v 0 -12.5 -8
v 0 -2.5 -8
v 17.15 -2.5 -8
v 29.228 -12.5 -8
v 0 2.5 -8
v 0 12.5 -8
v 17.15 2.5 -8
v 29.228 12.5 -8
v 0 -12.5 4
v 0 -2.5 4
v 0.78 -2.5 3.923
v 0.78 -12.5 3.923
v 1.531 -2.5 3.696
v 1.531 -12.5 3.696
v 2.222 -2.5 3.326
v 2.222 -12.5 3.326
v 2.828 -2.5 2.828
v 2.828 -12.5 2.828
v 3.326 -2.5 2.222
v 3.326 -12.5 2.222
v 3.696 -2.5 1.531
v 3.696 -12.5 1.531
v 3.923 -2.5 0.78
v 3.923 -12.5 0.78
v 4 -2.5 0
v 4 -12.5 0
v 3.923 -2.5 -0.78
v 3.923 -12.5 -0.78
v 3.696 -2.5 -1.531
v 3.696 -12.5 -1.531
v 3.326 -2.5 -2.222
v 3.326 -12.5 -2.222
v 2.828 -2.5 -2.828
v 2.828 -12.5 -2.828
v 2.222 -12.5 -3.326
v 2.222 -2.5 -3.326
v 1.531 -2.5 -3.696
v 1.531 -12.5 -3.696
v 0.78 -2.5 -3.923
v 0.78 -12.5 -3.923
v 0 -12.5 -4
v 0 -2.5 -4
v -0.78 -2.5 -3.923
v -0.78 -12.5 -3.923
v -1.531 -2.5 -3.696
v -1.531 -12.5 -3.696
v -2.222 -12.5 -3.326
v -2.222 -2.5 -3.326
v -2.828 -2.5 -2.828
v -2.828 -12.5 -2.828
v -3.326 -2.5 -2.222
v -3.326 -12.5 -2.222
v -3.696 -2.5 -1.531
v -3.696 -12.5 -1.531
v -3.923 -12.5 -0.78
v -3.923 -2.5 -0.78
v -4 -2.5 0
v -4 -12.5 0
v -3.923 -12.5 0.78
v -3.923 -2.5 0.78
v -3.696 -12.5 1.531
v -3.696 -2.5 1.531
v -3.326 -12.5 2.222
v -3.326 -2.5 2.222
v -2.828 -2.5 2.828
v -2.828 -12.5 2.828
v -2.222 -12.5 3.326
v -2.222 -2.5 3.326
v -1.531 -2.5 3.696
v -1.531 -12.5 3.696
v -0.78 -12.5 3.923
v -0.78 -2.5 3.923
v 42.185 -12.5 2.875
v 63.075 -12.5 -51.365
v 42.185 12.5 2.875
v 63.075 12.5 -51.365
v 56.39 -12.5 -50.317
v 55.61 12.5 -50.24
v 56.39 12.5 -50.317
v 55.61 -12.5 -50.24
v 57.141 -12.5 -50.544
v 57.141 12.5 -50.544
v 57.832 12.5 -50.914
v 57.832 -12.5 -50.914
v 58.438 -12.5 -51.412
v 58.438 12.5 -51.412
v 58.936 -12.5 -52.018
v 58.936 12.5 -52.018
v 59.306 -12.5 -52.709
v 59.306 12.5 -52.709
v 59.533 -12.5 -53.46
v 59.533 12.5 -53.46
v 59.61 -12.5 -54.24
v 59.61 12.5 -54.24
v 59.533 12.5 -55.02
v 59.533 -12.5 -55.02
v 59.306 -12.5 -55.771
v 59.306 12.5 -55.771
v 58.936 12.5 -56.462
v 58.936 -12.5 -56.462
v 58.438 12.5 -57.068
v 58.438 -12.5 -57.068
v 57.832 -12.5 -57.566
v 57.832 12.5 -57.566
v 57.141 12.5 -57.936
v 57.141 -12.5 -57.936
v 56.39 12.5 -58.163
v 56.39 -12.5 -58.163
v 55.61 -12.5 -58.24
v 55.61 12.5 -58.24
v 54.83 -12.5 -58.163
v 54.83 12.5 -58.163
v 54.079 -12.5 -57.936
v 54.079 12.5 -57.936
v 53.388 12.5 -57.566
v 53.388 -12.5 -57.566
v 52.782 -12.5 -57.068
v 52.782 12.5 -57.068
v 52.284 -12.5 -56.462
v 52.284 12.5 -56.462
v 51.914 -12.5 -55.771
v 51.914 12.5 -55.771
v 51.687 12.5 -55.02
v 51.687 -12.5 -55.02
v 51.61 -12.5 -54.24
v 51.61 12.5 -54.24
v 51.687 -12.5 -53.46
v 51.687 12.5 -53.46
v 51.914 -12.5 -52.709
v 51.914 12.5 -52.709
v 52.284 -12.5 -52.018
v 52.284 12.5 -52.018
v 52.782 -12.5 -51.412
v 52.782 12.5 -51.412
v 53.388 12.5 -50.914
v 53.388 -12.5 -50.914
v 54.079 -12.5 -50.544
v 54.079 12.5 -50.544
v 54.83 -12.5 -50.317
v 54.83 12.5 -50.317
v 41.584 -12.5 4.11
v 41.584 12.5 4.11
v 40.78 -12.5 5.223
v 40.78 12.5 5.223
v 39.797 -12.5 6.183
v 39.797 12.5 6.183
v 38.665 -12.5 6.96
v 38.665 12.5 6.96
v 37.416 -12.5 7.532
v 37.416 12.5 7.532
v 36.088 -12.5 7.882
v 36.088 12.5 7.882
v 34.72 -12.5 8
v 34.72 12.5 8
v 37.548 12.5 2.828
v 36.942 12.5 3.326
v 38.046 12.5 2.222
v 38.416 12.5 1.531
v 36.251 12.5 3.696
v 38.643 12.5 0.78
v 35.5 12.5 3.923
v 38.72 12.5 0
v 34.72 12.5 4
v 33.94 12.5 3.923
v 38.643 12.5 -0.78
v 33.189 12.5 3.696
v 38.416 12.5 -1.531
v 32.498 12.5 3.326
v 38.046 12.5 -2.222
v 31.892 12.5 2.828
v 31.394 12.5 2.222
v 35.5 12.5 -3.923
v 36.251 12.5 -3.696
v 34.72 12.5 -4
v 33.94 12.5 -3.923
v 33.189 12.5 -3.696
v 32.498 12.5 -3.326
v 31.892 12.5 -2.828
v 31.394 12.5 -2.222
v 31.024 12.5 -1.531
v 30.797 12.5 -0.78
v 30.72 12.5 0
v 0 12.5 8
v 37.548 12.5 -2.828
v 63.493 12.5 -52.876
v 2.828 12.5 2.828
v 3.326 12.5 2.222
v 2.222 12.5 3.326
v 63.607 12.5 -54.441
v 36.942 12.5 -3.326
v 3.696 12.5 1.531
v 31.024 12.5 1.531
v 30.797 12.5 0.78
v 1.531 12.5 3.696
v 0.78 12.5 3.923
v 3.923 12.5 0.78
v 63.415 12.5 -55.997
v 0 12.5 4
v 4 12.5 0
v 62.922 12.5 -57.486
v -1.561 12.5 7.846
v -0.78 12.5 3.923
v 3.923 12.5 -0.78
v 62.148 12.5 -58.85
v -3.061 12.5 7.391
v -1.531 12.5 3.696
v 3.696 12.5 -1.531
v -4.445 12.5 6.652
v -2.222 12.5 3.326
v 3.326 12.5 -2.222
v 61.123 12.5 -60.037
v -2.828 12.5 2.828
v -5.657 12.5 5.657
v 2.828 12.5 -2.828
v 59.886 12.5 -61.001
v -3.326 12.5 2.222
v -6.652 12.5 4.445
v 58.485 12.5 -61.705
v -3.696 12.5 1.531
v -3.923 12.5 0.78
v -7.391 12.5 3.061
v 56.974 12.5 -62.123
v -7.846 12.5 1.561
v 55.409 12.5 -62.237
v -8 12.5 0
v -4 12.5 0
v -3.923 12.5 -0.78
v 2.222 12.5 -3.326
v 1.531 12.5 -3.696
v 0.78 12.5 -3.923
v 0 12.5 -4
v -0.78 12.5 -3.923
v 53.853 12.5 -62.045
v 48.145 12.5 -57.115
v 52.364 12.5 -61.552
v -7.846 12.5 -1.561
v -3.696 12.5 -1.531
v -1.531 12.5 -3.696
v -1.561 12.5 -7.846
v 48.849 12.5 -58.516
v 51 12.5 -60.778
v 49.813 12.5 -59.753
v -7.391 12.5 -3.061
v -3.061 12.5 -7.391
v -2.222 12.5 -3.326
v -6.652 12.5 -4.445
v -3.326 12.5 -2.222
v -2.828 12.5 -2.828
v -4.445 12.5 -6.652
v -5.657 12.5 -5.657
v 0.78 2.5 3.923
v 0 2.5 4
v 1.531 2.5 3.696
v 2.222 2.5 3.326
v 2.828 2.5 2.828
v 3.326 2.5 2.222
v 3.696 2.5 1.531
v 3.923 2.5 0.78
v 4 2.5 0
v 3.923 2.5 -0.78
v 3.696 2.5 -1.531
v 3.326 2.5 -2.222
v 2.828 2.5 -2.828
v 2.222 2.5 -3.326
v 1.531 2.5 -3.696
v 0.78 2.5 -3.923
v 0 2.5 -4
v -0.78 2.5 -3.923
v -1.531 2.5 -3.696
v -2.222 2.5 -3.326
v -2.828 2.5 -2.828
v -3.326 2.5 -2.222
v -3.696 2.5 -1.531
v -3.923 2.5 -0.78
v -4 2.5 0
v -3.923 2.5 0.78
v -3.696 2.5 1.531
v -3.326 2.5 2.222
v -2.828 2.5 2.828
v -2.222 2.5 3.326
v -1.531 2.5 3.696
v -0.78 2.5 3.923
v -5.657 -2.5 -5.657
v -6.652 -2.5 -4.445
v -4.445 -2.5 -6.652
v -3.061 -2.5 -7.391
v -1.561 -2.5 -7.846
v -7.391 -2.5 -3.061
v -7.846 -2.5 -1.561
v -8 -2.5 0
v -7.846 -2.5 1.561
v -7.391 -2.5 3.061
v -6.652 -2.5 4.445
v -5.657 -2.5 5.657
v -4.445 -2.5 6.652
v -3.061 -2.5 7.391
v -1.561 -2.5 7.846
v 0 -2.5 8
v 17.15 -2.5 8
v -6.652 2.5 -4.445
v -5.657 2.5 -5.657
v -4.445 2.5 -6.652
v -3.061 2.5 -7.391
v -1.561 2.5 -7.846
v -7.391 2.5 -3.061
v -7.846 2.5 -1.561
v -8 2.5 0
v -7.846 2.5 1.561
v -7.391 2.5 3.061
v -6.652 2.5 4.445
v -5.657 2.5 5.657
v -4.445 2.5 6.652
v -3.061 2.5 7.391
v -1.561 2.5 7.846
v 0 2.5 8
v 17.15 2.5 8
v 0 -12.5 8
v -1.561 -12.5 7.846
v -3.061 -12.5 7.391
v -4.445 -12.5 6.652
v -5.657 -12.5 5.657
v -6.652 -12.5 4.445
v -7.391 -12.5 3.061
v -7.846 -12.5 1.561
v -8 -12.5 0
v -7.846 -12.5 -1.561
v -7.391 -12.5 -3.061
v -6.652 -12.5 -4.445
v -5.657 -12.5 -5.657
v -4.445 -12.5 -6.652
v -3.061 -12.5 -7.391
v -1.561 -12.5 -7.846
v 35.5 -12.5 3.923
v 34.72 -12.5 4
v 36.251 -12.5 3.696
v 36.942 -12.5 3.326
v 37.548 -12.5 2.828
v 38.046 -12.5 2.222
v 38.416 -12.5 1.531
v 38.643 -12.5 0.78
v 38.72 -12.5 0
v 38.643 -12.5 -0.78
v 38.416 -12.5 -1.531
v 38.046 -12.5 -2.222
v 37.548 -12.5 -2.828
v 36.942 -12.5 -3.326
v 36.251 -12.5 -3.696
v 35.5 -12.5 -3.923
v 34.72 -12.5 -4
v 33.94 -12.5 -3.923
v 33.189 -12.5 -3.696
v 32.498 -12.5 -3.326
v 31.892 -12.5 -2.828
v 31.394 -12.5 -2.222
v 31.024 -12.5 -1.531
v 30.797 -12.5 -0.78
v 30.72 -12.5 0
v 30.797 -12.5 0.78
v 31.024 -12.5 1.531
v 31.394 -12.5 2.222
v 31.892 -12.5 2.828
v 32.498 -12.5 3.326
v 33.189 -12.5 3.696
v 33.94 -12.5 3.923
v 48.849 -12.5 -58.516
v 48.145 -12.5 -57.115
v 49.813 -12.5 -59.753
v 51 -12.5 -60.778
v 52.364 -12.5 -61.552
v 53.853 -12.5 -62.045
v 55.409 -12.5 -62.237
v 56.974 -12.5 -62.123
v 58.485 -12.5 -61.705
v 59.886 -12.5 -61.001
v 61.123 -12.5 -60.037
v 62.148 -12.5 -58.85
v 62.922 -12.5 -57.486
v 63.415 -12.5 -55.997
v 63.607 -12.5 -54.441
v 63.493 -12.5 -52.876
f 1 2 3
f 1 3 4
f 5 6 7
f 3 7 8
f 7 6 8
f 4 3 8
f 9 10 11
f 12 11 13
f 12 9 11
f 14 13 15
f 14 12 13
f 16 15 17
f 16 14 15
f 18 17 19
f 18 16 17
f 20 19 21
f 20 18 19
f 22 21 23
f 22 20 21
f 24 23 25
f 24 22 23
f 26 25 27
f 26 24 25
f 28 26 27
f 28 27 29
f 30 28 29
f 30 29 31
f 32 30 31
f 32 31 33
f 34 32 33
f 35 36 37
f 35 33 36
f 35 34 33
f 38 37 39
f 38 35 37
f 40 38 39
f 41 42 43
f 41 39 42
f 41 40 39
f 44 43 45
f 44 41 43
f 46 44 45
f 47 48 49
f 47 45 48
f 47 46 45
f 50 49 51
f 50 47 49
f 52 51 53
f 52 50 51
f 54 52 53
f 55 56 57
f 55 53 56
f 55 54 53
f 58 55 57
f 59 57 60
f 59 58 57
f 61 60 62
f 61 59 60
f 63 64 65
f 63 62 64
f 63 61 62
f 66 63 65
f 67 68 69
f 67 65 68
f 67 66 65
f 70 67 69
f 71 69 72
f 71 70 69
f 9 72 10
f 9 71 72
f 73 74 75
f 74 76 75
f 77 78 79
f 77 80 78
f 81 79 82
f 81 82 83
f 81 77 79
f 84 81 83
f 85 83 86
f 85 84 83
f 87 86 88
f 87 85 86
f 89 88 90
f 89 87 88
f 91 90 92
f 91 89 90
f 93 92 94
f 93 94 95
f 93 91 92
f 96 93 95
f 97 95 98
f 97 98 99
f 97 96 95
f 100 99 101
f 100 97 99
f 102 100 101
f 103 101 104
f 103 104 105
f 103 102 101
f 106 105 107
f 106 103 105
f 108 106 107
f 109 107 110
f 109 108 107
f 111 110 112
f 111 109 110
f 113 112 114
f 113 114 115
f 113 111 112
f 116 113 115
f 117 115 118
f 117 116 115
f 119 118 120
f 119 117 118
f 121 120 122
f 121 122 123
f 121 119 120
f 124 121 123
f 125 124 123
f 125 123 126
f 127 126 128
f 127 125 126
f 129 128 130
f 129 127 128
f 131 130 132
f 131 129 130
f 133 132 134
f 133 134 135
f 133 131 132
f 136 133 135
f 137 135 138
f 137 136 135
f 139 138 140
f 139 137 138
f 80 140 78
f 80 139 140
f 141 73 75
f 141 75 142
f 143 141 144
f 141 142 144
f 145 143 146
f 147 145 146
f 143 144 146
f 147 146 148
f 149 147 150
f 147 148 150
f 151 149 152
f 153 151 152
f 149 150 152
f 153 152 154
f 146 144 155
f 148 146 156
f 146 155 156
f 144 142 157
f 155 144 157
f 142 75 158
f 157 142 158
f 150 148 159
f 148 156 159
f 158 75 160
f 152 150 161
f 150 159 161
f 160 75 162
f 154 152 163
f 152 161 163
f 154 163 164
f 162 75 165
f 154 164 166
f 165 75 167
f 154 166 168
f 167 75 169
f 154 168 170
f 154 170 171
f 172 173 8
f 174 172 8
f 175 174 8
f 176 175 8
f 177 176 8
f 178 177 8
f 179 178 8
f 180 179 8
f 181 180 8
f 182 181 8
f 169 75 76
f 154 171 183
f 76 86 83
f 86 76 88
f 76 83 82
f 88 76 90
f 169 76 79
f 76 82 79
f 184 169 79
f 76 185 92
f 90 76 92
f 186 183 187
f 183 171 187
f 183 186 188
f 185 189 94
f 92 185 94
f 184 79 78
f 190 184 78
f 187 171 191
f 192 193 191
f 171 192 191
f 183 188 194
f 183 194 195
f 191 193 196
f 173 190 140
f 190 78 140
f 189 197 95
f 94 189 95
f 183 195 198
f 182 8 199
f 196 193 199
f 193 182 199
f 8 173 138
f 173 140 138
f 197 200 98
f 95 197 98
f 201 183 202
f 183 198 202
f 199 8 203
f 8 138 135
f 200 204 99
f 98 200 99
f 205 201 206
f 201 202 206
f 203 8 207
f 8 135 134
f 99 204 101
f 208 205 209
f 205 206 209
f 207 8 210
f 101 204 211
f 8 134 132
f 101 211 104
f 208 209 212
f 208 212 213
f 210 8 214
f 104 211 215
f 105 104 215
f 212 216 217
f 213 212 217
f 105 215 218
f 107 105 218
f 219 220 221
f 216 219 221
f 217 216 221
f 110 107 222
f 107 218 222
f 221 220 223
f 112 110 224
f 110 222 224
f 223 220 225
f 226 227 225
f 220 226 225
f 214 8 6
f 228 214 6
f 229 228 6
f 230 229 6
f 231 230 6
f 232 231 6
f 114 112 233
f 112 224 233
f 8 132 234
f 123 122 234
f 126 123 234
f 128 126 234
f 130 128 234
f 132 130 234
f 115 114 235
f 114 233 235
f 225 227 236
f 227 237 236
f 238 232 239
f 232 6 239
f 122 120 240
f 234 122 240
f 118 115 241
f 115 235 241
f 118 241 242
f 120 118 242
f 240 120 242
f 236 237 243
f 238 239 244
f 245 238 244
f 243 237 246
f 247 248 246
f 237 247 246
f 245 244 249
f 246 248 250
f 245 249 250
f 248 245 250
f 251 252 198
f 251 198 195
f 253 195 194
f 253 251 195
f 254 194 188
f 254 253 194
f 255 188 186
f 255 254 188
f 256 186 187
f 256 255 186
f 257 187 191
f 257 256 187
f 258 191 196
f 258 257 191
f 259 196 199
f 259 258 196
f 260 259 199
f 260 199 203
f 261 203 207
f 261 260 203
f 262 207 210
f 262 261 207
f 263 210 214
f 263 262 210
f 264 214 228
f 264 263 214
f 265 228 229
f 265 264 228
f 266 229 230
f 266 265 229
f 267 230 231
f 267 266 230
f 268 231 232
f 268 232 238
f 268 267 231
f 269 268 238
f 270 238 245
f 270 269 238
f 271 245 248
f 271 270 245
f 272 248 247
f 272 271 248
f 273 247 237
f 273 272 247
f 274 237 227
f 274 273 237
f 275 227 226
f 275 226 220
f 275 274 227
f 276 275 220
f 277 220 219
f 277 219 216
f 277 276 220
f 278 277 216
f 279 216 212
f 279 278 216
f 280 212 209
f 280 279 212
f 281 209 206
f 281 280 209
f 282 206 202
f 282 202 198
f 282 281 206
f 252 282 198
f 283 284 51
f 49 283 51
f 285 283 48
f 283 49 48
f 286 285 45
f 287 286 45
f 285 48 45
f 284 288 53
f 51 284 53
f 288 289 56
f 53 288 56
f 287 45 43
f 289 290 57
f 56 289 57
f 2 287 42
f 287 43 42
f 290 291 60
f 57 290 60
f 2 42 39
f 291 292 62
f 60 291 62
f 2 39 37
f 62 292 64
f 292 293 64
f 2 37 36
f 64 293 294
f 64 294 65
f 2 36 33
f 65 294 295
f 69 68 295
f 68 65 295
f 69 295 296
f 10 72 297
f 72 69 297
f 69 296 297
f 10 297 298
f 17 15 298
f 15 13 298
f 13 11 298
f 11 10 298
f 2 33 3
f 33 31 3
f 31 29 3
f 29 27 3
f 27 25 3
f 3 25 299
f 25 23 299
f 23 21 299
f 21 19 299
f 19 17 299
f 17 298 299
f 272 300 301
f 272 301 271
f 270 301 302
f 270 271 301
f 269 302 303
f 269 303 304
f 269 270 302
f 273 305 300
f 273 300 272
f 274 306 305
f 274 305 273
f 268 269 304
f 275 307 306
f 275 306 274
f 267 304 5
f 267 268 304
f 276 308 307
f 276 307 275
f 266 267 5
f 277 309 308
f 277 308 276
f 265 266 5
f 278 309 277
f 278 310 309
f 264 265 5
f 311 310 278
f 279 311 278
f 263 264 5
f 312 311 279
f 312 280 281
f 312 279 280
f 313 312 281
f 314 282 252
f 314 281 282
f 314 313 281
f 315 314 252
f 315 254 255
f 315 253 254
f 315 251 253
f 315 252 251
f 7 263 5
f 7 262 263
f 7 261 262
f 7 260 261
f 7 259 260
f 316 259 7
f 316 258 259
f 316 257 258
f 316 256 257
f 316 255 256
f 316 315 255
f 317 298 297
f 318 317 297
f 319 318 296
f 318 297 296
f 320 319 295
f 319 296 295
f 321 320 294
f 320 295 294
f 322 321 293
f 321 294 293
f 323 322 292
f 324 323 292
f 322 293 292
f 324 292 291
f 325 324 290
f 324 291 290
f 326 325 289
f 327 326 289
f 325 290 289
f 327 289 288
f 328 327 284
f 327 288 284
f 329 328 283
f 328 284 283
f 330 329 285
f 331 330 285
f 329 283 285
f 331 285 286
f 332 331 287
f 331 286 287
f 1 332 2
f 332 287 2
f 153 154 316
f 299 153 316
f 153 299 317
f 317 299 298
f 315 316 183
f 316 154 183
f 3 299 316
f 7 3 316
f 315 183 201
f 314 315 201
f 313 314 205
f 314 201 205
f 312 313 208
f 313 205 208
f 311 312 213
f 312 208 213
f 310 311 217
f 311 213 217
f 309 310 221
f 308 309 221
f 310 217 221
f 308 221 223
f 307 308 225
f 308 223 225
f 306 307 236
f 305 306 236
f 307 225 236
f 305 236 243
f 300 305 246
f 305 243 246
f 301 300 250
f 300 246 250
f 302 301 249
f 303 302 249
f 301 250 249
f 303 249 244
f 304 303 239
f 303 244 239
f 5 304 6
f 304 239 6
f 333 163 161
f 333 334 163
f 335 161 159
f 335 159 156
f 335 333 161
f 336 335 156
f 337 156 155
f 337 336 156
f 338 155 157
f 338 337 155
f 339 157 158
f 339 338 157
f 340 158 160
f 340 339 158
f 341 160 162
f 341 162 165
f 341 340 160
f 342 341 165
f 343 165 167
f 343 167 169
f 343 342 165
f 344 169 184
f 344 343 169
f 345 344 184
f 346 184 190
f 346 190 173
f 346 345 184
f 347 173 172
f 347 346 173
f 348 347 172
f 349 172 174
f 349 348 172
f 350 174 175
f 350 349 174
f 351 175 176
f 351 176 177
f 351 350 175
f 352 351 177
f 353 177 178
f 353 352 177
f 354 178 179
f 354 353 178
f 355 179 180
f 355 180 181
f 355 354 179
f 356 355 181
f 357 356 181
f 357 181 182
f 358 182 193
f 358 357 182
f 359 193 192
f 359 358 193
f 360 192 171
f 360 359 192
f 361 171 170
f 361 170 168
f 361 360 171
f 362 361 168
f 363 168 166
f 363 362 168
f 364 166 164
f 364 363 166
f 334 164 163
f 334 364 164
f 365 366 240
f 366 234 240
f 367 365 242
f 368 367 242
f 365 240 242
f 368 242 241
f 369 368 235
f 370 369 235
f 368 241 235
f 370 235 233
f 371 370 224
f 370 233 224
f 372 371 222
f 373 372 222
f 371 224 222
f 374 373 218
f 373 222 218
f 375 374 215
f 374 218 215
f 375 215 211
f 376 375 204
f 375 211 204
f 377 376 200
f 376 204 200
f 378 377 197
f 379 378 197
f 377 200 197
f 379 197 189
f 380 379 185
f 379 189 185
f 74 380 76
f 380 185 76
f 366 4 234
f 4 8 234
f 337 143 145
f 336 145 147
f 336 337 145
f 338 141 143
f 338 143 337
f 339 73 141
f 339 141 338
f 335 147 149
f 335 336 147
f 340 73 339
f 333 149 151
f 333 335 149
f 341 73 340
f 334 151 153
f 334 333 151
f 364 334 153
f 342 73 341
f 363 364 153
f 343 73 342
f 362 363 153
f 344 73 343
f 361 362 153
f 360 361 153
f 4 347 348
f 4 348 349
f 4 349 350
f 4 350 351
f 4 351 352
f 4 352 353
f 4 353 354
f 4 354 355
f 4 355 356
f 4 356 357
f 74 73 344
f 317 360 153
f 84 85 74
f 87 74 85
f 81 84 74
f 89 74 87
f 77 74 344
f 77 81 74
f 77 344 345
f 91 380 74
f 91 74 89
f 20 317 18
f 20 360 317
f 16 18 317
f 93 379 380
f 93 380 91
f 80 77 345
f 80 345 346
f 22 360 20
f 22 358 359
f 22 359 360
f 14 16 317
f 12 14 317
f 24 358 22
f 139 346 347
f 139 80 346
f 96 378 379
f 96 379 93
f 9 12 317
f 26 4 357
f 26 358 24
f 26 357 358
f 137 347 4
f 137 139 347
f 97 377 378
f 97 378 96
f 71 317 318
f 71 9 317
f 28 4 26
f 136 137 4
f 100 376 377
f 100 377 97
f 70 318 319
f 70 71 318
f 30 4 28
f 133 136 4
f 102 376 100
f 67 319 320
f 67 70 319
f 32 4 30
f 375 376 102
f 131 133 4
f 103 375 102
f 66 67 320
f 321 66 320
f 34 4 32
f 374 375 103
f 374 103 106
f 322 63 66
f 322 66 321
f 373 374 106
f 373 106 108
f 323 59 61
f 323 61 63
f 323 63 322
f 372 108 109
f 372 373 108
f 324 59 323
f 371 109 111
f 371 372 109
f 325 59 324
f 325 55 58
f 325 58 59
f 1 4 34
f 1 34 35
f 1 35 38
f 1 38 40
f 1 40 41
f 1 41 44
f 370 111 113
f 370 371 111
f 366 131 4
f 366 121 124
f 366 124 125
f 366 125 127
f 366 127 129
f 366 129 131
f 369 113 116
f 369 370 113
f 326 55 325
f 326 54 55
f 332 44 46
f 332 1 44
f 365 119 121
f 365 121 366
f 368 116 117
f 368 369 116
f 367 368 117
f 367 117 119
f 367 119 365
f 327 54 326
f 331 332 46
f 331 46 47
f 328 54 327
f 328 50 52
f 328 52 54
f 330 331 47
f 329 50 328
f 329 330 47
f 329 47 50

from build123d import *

# Parameters (mm, degrees)
SKETCH_1_R          = 4
EXTRUDE_1_DEPTH     = 12.5
SKETCH_2_W          = 25.15
SKETCH_2_H          = 5
CUT_EXTRUDE_1_DEPTH = 16


with BuildPart() as part:
    # 草图1 → 凸台-拉伸1 (new, symmetric)
    with BuildSketch(Plane(origin=(0, 0, 0), x_dir=(1, 0, 0), z_dir=(0, 1, 0))):
        with BuildLine():
            Line((0, 8), (29.228297239, 8))
            Line((29.228297239, 8), (48.144548452, 57.11524489))
            ThreePointArc((48.144548452, 57.11524489), (58.48524489, 61.705451548), (63.075451548, 51.36475511))
            Line((63.075451548, 51.36475511), (42.185451548, -2.87524489))
            ThreePointArc((42.185451548, -2.87524489), (39.247584393, -6.595527239), (34.72, -8))
            Line((34.72, -8), (0, -8))
            ThreePointArc((0, -8), (-8, 0), (0, 8))
        make_face()
        with Locations(Location((0, 0, 0), (0, 0, 270))):
            Circle(SKETCH_1_R, mode=Mode.SUBTRACT)
        with Locations(Location((34.72, 0, 0), (0, 0, 270))):
            Circle(SKETCH_1_R, mode=Mode.SUBTRACT)
        with Locations(Location((55.61, 54.24, 0), (0, 0, 270))):
            Circle(SKETCH_1_R, mode=Mode.SUBTRACT)
    extrude(amount=EXTRUDE_1_DEPTH, both=True)

    # 草图2 → 切除-拉伸1 (cut)
    with BuildSketch(Plane.XY.offset(8)):
        with Locations((4.575, 0)):
            Rectangle(SKETCH_2_W, SKETCH_2_H)
    extrude(amount=-CUT_EXTRUDE_1_DEPTH, mode=Mode.SUBTRACT)


solid = part.part
